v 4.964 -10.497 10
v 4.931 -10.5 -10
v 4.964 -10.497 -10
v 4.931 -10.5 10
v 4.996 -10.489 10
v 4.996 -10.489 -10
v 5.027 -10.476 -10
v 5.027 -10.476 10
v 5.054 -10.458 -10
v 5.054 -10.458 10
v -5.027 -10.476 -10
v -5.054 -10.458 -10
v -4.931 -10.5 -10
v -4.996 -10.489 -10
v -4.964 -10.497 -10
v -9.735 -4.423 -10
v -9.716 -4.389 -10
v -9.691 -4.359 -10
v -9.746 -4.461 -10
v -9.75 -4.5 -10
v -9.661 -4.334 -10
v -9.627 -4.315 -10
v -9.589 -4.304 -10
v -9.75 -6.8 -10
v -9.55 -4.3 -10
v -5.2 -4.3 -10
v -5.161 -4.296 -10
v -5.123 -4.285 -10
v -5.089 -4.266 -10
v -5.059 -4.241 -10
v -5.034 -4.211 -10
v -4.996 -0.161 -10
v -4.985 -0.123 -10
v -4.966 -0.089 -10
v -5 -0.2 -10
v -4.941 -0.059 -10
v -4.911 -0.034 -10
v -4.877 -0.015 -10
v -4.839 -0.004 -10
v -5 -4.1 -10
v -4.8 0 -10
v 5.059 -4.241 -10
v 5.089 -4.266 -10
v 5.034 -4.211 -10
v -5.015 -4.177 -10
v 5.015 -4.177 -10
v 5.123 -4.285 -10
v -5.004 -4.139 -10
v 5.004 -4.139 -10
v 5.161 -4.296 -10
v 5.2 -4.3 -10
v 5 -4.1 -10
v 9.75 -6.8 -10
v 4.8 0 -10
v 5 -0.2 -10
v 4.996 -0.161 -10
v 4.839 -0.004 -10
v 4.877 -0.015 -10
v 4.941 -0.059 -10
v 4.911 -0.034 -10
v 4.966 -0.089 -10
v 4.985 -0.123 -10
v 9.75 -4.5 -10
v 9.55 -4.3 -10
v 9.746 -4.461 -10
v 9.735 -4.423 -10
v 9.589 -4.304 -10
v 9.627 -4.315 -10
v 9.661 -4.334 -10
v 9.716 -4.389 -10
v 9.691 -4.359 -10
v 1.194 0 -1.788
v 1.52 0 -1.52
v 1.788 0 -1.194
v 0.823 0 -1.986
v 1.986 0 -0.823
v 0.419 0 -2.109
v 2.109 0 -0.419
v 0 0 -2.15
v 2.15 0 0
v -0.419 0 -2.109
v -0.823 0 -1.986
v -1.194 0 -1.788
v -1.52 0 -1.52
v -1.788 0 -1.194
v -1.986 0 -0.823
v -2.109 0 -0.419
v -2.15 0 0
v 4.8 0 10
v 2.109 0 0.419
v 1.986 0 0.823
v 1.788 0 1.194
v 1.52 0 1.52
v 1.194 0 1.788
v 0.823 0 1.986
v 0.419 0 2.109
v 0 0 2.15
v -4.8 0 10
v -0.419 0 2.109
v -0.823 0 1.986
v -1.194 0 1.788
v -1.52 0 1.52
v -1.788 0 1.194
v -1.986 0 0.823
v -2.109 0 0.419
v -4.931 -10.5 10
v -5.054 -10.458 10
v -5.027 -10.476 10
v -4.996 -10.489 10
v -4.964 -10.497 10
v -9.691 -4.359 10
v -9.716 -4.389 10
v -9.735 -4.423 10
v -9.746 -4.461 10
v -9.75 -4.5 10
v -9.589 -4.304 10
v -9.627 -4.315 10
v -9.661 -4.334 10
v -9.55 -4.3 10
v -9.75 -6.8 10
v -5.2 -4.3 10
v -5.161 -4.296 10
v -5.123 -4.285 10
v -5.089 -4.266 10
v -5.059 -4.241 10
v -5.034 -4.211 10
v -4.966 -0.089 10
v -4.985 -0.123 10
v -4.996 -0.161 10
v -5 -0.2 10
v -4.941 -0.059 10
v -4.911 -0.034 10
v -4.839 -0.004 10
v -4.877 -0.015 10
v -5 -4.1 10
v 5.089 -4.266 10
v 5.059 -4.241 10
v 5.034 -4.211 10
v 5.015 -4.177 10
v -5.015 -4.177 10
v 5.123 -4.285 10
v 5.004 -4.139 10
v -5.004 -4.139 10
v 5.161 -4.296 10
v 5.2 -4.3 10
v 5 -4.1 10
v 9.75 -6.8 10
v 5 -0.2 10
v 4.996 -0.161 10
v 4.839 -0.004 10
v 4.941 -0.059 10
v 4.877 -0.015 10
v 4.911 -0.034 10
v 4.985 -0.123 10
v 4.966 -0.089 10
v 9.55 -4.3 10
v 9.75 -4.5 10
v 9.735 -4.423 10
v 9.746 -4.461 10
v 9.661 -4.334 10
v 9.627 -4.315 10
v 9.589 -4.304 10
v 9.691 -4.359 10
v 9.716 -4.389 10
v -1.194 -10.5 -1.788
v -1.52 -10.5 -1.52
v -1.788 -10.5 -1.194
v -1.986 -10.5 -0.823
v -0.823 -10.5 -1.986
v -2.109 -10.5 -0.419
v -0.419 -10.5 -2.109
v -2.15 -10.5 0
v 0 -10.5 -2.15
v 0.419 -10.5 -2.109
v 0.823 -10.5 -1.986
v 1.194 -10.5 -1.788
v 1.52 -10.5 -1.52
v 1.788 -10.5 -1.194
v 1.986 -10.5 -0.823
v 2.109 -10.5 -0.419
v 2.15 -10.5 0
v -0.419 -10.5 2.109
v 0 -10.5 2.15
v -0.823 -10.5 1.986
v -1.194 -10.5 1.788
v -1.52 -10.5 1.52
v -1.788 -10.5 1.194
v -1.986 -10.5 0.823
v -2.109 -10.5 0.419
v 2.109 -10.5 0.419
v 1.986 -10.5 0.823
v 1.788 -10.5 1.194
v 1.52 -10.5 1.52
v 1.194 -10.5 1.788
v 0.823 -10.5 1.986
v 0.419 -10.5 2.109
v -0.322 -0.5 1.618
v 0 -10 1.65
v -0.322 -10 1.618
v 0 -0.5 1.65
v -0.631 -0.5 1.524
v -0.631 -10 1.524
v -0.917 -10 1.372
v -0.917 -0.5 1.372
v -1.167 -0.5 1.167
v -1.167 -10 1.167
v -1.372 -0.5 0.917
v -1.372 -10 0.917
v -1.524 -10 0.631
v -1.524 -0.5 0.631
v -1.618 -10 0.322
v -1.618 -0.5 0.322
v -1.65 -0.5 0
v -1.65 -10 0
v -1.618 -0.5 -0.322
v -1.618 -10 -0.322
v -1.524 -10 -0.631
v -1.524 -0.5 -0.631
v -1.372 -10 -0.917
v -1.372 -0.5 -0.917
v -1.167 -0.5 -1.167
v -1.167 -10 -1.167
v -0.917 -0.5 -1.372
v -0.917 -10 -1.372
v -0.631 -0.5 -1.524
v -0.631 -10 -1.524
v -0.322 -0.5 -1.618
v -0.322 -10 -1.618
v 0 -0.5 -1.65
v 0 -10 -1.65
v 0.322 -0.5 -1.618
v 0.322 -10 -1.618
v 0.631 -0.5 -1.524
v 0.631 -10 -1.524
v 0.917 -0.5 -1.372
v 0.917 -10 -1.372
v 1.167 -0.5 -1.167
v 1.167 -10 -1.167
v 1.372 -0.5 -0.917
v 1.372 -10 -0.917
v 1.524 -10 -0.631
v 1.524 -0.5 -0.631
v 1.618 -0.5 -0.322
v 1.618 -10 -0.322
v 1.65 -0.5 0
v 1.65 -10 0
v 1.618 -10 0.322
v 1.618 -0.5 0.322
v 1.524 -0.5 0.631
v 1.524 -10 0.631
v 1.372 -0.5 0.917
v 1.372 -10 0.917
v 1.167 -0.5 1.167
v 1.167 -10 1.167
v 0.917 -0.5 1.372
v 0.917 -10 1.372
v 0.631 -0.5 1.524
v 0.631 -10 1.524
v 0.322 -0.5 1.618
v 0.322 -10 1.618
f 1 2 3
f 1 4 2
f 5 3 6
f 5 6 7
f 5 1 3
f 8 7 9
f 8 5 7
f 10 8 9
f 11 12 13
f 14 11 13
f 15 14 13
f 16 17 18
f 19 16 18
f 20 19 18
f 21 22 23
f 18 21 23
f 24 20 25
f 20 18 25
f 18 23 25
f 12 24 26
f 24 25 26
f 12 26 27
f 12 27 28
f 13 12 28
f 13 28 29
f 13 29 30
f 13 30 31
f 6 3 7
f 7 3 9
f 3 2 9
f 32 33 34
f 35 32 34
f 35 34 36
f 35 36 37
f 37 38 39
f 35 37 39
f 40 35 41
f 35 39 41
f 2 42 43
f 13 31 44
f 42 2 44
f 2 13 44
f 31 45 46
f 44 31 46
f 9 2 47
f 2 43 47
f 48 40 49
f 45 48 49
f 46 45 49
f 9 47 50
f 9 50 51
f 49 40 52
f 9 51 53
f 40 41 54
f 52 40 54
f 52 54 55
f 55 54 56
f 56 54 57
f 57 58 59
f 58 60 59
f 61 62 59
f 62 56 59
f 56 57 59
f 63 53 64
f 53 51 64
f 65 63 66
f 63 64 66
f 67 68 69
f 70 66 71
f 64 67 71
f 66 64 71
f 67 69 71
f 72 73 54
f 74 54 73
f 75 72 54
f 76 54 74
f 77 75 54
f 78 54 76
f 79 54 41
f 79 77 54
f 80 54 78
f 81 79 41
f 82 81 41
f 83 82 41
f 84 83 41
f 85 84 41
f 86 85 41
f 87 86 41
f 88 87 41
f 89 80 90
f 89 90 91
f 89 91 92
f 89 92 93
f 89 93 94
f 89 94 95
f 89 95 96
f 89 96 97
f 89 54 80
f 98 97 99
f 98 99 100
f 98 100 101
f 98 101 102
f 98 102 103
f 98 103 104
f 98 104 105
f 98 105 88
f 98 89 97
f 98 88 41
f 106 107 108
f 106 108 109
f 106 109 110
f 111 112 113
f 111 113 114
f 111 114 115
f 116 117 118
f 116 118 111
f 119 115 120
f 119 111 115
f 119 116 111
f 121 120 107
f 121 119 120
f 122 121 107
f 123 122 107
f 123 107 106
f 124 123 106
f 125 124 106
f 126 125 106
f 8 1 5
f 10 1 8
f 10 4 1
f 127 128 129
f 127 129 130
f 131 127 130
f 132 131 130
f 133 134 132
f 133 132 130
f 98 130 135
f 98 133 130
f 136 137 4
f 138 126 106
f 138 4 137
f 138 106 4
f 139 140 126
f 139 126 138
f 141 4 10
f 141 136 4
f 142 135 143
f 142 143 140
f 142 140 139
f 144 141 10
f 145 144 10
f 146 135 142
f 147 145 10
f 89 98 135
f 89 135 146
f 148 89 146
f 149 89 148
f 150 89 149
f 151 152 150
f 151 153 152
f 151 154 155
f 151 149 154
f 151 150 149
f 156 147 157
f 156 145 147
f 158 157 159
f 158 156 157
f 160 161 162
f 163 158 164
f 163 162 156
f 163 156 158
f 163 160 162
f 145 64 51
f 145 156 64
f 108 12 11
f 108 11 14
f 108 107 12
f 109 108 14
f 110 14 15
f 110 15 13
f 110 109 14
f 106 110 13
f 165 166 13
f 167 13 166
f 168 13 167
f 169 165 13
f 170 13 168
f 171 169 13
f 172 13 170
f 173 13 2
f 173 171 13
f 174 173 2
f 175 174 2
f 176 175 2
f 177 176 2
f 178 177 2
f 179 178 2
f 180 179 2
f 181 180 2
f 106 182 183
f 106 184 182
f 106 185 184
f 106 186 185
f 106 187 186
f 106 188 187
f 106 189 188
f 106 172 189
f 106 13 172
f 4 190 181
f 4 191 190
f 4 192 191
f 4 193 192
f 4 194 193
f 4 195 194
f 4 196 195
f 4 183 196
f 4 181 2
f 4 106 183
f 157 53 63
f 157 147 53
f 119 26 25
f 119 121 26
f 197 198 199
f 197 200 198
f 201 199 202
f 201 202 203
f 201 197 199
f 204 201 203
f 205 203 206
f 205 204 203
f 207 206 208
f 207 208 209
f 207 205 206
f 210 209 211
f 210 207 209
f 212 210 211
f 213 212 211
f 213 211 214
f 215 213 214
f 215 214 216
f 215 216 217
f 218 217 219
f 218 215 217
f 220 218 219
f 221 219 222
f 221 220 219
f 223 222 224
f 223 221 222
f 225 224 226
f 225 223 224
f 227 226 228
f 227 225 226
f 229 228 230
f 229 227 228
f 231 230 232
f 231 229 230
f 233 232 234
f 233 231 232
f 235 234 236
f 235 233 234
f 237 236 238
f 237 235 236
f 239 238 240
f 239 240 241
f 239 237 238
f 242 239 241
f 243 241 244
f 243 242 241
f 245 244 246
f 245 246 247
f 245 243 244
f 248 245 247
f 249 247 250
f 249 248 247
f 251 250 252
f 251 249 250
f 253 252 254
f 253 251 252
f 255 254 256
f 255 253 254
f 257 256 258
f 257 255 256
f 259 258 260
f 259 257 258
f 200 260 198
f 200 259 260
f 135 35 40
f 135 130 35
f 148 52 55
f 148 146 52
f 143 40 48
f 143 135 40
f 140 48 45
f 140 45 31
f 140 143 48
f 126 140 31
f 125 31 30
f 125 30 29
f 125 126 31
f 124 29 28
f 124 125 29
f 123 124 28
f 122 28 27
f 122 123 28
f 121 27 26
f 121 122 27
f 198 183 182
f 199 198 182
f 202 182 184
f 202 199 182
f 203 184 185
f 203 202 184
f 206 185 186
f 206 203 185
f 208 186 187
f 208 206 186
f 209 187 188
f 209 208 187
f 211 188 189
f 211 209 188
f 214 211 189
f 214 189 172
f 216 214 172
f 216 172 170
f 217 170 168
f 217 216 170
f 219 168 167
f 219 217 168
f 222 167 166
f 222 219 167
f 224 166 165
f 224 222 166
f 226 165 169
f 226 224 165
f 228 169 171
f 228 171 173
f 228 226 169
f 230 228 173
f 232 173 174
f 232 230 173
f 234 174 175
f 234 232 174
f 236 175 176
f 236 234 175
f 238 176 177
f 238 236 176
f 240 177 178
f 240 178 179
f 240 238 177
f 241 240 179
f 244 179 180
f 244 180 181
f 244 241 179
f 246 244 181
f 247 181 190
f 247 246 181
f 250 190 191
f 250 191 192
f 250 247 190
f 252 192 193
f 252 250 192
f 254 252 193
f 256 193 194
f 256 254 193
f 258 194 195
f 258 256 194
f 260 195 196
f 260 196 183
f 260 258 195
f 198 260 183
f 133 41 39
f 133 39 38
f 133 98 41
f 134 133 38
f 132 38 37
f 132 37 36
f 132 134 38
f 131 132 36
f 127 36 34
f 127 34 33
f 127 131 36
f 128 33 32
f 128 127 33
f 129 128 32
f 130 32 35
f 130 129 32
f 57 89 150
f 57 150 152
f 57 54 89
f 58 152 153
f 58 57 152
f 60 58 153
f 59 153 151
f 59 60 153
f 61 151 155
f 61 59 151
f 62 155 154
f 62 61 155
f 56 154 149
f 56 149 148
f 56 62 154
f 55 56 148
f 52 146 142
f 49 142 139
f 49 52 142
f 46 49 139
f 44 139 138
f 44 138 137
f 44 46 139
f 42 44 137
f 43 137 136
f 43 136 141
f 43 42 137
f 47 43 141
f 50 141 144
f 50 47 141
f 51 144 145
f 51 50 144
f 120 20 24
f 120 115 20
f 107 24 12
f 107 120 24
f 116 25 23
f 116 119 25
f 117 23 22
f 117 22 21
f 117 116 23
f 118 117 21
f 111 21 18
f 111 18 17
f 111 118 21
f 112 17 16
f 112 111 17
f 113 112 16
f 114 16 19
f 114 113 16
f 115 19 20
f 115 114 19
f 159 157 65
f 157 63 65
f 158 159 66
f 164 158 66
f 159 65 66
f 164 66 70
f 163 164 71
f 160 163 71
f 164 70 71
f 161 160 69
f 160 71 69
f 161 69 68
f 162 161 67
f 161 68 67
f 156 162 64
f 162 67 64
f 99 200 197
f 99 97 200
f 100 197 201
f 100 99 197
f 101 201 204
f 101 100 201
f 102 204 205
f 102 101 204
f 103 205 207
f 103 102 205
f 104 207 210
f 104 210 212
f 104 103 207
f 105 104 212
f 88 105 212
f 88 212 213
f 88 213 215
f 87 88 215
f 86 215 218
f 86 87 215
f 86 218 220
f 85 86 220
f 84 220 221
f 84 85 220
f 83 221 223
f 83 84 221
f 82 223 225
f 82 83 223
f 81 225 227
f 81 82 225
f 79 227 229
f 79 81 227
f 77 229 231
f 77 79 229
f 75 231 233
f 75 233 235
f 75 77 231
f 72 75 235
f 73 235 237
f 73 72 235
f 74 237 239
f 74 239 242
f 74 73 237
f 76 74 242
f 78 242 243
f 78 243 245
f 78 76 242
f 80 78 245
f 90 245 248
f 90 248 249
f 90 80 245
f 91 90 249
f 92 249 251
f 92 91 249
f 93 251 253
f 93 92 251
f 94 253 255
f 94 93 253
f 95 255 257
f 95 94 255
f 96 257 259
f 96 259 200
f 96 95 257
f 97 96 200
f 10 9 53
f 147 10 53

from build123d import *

# Parameters (mm, degrees)
EXTRUDE_1_DEPTH = 10
FILLET_1_R      = 0.2


with BuildPart() as part:
    # Эскиз1 → Бобышка-Вытянуть1 (new body, symmetric)
    with BuildSketch(Plane.XY):
        Polygon((5, 0), (-5, 0), (-5, -4.3), (-9.75, -4.3), (-9.75, -6.8), (-5, -10.5), (5, -10.5), (9.75, -6.8), (9.75, -4.3), (5, -4.3), align=None)
    extrude(amount=EXTRUDE_1_DEPTH, both=True)

    # Эскиз4 → Отверстие обработанное метчиком M44 (revolve, cut)
    with BuildSketch(Plane(origin=(0, 0, 0), x_dir=(0, 0, 1), z_dir=(1, 0, 0))):
        Polygon((0, 0), (0, 10.5), (2.15, 10.5), (1.65, 10), (1.65, 0.5), (2.15, 0), align=None)
    revolve(axis=Axis((0, 6.35, 0), (0, -1, 0)), mode=Mode.SUBTRACT)

    # Скругление1
    fillet_1_edges = [part.edges().sort_by_distance(p)[0] for p in [
        (-5, 0, 0),
        (5, 0, 0),
        (5, -4.3, 0),
        (9.75, -4.3, 0),
        (5, -10.5, 0),
        (-5, -10.5, 0),
        (-9.75, -4.3, 0),
        (-5, -4.3, 0),
    ]]
    fillet(fillet_1_edges, radius=FILLET_1_R)


solid = part.part
